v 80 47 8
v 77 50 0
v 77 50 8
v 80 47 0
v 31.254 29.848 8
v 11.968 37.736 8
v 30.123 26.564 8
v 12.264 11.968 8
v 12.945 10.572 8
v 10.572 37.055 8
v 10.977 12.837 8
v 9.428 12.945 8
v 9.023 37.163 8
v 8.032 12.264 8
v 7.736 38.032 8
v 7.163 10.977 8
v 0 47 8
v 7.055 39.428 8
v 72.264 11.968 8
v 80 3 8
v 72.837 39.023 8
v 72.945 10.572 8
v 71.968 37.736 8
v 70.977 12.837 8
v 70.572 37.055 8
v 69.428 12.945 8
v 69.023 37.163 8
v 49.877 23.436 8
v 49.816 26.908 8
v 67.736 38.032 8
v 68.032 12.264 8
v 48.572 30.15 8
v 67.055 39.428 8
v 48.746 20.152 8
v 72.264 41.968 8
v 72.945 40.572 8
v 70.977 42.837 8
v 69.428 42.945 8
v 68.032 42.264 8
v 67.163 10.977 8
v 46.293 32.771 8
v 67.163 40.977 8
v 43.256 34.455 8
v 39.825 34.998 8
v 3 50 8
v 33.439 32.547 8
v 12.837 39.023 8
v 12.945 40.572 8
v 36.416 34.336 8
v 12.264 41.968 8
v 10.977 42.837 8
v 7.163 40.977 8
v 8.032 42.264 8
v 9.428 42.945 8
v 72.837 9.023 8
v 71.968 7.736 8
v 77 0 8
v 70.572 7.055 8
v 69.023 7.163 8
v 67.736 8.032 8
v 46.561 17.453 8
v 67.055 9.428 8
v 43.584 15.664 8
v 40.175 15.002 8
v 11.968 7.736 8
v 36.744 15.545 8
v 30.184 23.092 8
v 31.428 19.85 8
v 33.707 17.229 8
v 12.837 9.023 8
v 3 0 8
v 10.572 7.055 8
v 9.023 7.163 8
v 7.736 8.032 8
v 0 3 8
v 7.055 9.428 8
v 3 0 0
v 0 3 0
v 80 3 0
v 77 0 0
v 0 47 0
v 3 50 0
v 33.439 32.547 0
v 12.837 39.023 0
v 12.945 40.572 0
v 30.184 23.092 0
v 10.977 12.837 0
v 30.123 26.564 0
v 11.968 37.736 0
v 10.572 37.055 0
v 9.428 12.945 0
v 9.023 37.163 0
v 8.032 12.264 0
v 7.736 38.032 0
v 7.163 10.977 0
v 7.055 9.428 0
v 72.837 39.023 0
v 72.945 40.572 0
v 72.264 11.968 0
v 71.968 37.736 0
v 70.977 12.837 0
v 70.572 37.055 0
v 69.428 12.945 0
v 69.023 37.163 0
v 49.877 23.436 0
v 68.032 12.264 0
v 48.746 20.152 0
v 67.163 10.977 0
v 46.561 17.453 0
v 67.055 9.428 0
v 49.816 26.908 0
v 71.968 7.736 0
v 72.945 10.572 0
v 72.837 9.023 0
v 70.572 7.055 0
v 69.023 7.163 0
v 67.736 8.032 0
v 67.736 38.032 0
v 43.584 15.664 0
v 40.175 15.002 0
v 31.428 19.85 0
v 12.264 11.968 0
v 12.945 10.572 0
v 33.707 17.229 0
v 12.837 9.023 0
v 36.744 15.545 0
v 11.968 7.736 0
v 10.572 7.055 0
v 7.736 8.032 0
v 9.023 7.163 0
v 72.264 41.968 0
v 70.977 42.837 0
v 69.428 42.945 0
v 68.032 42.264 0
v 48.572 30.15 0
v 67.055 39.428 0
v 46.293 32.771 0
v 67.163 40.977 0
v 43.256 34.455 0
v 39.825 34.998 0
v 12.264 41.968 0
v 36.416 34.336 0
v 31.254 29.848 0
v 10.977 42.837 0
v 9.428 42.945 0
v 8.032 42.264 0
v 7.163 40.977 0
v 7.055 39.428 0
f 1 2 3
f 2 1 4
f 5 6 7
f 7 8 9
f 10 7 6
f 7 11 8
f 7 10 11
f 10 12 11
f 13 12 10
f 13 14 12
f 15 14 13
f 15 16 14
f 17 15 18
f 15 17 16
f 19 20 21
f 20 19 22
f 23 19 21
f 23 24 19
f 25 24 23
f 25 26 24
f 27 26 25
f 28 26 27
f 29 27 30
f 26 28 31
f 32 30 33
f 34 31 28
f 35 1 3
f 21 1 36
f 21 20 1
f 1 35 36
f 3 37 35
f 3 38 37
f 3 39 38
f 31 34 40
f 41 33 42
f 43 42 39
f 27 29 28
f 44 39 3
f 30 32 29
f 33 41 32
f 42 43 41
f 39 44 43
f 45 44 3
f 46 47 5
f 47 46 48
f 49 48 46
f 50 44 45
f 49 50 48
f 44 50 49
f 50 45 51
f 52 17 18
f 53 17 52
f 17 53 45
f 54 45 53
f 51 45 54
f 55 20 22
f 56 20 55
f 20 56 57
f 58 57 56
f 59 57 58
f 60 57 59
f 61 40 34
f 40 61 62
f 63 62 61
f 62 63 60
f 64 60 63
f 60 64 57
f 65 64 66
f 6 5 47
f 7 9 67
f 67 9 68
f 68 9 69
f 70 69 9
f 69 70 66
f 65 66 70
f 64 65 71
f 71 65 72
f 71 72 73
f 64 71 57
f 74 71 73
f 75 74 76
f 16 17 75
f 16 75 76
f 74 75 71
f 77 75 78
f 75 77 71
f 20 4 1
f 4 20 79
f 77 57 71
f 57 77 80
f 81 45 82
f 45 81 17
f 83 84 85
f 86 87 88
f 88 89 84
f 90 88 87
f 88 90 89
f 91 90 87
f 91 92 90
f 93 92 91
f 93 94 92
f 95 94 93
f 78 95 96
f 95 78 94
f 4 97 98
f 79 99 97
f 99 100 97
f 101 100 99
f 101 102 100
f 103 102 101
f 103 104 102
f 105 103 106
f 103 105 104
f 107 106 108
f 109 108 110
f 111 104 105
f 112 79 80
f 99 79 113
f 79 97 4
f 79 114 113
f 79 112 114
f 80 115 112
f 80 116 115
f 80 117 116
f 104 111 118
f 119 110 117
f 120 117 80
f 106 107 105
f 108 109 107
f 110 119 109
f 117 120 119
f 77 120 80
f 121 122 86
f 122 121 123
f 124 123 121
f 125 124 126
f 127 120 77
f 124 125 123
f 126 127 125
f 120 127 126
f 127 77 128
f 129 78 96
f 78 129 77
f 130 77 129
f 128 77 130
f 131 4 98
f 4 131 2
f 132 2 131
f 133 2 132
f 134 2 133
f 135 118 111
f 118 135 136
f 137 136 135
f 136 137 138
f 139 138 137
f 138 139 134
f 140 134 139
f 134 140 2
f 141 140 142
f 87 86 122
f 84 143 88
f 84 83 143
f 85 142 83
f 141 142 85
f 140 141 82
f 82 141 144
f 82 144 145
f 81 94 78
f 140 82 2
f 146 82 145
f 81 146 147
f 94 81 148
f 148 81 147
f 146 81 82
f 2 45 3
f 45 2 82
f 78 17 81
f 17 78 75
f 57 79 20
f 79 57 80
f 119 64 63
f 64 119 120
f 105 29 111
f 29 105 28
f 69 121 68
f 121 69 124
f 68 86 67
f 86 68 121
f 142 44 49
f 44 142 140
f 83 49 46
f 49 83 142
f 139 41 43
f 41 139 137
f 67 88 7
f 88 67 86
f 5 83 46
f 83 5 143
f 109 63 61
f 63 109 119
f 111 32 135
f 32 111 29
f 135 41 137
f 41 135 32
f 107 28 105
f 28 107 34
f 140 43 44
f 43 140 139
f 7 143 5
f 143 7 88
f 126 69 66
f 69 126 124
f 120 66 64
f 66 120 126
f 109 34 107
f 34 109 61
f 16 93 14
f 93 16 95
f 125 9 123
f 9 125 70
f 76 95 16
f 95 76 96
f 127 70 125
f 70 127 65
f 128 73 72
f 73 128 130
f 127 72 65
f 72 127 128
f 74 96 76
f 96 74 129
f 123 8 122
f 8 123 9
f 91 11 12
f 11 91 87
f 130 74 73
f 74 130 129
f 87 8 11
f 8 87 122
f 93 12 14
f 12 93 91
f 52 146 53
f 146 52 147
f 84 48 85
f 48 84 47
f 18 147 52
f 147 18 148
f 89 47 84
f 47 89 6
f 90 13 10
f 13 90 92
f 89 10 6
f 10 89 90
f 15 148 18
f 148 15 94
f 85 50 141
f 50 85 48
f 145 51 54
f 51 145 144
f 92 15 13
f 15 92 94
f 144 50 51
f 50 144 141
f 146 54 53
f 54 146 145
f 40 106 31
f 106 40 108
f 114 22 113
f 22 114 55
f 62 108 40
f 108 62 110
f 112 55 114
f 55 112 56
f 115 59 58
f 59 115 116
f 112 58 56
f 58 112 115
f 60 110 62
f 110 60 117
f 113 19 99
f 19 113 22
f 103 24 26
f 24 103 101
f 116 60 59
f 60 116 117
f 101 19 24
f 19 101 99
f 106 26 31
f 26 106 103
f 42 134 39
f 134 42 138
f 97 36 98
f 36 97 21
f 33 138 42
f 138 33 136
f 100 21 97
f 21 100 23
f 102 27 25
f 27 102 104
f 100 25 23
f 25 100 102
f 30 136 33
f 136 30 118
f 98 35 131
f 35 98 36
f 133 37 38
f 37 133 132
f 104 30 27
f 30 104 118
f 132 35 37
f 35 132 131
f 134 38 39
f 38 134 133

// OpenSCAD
$fn = 32;

// ----------------------------------------------------------------------
// Spacer plate: rect 80 x 50
// ----------------------------------------------------------------------

// --- parameters (mm) ---
bore_r = 10;              // centre bore radius
bolt_r = 3;               // bolt hole radius
plate_t = 8;              // plate thickness, Z (extrusion height)
plate_l = 80;             // plate length, X
plate_w = 50;             // plate width, Y
inset = 10;               // corner hole inset

profile = [[3, 0], [77, 0], [80, 3], [80, 47], [77, 50], [3, 50], [0, 47], [0, 3]];  // primary outline, 8 points, counter clockwise
void_1 = [[49.816, 26.908], [48.572, 30.15], [46.293, 32.771], [43.256, 34.455], [39.825, 34.998], [36.416, 34.336], [33.439, 32.547], [31.254, 29.848], [30.123, 26.564], [30.184, 23.092], [31.428, 19.85], [33.707, 17.229], [36.744, 15.545], [40.175, 15.002], [43.584, 15.664], [46.561, 17.453], [48.746, 20.152], [49.877, 23.436]];  // centre bore, 18 points
void_2 = [[12.945, 10.572], [12.264, 11.968], [10.977, 12.837], [9.428, 12.945], [8.032, 12.264], [7.163, 10.977], [7.055, 9.428], [7.736, 8.032], [9.023, 7.163], [10.572, 7.055], [11.968, 7.736], [12.837, 9.023]];  // corner hole, 12 points
void_3 = [[12.945, 40.572], [12.264, 41.968], [10.977, 42.837], [9.428, 42.945], [8.032, 42.264], [7.163, 40.977], [7.055, 39.428], [7.736, 38.032], [9.023, 37.163], [10.572, 37.055], [11.968, 37.736], [12.837, 39.023]];  // corner hole, 12 points
void_4 = [[72.945, 10.572], [72.264, 11.968], [70.977, 12.837], [69.428, 12.945], [68.032, 12.264], [67.163, 10.977], [67.055, 9.428], [67.736, 8.032], [69.023, 7.163], [70.572, 7.055], [71.968, 7.736], [72.837, 9.023]];  // corner hole, 12 points
void_5 = [[72.945, 40.572], [72.264, 41.968], [70.977, 42.837], [69.428, 42.945], [68.032, 42.264], [67.163, 40.977], [67.055, 39.428], [67.736, 38.032], [69.023, 37.163], [70.572, 37.055], [71.968, 37.736], [72.837, 39.023]];  // corner hole, 12 points

// --- the one profile operation ---
difference() {
  linear_extrude(height = plate_t) polygon(points = profile);
  translate([0, 0, -1])
    linear_extrude(height = plate_t + 2) polygon(points = void_1);
  translate([0, 0, -1])
    linear_extrude(height = plate_t + 2) polygon(points = void_2);
  translate([0, 0, -1])
    linear_extrude(height = plate_t + 2) polygon(points = void_3);
  translate([0, 0, -1])
    linear_extrude(height = plate_t + 2) polygon(points = void_4);
  translate([0, 0, -1])
    linear_extrude(height = plate_t + 2) polygon(points = void_5);
}
